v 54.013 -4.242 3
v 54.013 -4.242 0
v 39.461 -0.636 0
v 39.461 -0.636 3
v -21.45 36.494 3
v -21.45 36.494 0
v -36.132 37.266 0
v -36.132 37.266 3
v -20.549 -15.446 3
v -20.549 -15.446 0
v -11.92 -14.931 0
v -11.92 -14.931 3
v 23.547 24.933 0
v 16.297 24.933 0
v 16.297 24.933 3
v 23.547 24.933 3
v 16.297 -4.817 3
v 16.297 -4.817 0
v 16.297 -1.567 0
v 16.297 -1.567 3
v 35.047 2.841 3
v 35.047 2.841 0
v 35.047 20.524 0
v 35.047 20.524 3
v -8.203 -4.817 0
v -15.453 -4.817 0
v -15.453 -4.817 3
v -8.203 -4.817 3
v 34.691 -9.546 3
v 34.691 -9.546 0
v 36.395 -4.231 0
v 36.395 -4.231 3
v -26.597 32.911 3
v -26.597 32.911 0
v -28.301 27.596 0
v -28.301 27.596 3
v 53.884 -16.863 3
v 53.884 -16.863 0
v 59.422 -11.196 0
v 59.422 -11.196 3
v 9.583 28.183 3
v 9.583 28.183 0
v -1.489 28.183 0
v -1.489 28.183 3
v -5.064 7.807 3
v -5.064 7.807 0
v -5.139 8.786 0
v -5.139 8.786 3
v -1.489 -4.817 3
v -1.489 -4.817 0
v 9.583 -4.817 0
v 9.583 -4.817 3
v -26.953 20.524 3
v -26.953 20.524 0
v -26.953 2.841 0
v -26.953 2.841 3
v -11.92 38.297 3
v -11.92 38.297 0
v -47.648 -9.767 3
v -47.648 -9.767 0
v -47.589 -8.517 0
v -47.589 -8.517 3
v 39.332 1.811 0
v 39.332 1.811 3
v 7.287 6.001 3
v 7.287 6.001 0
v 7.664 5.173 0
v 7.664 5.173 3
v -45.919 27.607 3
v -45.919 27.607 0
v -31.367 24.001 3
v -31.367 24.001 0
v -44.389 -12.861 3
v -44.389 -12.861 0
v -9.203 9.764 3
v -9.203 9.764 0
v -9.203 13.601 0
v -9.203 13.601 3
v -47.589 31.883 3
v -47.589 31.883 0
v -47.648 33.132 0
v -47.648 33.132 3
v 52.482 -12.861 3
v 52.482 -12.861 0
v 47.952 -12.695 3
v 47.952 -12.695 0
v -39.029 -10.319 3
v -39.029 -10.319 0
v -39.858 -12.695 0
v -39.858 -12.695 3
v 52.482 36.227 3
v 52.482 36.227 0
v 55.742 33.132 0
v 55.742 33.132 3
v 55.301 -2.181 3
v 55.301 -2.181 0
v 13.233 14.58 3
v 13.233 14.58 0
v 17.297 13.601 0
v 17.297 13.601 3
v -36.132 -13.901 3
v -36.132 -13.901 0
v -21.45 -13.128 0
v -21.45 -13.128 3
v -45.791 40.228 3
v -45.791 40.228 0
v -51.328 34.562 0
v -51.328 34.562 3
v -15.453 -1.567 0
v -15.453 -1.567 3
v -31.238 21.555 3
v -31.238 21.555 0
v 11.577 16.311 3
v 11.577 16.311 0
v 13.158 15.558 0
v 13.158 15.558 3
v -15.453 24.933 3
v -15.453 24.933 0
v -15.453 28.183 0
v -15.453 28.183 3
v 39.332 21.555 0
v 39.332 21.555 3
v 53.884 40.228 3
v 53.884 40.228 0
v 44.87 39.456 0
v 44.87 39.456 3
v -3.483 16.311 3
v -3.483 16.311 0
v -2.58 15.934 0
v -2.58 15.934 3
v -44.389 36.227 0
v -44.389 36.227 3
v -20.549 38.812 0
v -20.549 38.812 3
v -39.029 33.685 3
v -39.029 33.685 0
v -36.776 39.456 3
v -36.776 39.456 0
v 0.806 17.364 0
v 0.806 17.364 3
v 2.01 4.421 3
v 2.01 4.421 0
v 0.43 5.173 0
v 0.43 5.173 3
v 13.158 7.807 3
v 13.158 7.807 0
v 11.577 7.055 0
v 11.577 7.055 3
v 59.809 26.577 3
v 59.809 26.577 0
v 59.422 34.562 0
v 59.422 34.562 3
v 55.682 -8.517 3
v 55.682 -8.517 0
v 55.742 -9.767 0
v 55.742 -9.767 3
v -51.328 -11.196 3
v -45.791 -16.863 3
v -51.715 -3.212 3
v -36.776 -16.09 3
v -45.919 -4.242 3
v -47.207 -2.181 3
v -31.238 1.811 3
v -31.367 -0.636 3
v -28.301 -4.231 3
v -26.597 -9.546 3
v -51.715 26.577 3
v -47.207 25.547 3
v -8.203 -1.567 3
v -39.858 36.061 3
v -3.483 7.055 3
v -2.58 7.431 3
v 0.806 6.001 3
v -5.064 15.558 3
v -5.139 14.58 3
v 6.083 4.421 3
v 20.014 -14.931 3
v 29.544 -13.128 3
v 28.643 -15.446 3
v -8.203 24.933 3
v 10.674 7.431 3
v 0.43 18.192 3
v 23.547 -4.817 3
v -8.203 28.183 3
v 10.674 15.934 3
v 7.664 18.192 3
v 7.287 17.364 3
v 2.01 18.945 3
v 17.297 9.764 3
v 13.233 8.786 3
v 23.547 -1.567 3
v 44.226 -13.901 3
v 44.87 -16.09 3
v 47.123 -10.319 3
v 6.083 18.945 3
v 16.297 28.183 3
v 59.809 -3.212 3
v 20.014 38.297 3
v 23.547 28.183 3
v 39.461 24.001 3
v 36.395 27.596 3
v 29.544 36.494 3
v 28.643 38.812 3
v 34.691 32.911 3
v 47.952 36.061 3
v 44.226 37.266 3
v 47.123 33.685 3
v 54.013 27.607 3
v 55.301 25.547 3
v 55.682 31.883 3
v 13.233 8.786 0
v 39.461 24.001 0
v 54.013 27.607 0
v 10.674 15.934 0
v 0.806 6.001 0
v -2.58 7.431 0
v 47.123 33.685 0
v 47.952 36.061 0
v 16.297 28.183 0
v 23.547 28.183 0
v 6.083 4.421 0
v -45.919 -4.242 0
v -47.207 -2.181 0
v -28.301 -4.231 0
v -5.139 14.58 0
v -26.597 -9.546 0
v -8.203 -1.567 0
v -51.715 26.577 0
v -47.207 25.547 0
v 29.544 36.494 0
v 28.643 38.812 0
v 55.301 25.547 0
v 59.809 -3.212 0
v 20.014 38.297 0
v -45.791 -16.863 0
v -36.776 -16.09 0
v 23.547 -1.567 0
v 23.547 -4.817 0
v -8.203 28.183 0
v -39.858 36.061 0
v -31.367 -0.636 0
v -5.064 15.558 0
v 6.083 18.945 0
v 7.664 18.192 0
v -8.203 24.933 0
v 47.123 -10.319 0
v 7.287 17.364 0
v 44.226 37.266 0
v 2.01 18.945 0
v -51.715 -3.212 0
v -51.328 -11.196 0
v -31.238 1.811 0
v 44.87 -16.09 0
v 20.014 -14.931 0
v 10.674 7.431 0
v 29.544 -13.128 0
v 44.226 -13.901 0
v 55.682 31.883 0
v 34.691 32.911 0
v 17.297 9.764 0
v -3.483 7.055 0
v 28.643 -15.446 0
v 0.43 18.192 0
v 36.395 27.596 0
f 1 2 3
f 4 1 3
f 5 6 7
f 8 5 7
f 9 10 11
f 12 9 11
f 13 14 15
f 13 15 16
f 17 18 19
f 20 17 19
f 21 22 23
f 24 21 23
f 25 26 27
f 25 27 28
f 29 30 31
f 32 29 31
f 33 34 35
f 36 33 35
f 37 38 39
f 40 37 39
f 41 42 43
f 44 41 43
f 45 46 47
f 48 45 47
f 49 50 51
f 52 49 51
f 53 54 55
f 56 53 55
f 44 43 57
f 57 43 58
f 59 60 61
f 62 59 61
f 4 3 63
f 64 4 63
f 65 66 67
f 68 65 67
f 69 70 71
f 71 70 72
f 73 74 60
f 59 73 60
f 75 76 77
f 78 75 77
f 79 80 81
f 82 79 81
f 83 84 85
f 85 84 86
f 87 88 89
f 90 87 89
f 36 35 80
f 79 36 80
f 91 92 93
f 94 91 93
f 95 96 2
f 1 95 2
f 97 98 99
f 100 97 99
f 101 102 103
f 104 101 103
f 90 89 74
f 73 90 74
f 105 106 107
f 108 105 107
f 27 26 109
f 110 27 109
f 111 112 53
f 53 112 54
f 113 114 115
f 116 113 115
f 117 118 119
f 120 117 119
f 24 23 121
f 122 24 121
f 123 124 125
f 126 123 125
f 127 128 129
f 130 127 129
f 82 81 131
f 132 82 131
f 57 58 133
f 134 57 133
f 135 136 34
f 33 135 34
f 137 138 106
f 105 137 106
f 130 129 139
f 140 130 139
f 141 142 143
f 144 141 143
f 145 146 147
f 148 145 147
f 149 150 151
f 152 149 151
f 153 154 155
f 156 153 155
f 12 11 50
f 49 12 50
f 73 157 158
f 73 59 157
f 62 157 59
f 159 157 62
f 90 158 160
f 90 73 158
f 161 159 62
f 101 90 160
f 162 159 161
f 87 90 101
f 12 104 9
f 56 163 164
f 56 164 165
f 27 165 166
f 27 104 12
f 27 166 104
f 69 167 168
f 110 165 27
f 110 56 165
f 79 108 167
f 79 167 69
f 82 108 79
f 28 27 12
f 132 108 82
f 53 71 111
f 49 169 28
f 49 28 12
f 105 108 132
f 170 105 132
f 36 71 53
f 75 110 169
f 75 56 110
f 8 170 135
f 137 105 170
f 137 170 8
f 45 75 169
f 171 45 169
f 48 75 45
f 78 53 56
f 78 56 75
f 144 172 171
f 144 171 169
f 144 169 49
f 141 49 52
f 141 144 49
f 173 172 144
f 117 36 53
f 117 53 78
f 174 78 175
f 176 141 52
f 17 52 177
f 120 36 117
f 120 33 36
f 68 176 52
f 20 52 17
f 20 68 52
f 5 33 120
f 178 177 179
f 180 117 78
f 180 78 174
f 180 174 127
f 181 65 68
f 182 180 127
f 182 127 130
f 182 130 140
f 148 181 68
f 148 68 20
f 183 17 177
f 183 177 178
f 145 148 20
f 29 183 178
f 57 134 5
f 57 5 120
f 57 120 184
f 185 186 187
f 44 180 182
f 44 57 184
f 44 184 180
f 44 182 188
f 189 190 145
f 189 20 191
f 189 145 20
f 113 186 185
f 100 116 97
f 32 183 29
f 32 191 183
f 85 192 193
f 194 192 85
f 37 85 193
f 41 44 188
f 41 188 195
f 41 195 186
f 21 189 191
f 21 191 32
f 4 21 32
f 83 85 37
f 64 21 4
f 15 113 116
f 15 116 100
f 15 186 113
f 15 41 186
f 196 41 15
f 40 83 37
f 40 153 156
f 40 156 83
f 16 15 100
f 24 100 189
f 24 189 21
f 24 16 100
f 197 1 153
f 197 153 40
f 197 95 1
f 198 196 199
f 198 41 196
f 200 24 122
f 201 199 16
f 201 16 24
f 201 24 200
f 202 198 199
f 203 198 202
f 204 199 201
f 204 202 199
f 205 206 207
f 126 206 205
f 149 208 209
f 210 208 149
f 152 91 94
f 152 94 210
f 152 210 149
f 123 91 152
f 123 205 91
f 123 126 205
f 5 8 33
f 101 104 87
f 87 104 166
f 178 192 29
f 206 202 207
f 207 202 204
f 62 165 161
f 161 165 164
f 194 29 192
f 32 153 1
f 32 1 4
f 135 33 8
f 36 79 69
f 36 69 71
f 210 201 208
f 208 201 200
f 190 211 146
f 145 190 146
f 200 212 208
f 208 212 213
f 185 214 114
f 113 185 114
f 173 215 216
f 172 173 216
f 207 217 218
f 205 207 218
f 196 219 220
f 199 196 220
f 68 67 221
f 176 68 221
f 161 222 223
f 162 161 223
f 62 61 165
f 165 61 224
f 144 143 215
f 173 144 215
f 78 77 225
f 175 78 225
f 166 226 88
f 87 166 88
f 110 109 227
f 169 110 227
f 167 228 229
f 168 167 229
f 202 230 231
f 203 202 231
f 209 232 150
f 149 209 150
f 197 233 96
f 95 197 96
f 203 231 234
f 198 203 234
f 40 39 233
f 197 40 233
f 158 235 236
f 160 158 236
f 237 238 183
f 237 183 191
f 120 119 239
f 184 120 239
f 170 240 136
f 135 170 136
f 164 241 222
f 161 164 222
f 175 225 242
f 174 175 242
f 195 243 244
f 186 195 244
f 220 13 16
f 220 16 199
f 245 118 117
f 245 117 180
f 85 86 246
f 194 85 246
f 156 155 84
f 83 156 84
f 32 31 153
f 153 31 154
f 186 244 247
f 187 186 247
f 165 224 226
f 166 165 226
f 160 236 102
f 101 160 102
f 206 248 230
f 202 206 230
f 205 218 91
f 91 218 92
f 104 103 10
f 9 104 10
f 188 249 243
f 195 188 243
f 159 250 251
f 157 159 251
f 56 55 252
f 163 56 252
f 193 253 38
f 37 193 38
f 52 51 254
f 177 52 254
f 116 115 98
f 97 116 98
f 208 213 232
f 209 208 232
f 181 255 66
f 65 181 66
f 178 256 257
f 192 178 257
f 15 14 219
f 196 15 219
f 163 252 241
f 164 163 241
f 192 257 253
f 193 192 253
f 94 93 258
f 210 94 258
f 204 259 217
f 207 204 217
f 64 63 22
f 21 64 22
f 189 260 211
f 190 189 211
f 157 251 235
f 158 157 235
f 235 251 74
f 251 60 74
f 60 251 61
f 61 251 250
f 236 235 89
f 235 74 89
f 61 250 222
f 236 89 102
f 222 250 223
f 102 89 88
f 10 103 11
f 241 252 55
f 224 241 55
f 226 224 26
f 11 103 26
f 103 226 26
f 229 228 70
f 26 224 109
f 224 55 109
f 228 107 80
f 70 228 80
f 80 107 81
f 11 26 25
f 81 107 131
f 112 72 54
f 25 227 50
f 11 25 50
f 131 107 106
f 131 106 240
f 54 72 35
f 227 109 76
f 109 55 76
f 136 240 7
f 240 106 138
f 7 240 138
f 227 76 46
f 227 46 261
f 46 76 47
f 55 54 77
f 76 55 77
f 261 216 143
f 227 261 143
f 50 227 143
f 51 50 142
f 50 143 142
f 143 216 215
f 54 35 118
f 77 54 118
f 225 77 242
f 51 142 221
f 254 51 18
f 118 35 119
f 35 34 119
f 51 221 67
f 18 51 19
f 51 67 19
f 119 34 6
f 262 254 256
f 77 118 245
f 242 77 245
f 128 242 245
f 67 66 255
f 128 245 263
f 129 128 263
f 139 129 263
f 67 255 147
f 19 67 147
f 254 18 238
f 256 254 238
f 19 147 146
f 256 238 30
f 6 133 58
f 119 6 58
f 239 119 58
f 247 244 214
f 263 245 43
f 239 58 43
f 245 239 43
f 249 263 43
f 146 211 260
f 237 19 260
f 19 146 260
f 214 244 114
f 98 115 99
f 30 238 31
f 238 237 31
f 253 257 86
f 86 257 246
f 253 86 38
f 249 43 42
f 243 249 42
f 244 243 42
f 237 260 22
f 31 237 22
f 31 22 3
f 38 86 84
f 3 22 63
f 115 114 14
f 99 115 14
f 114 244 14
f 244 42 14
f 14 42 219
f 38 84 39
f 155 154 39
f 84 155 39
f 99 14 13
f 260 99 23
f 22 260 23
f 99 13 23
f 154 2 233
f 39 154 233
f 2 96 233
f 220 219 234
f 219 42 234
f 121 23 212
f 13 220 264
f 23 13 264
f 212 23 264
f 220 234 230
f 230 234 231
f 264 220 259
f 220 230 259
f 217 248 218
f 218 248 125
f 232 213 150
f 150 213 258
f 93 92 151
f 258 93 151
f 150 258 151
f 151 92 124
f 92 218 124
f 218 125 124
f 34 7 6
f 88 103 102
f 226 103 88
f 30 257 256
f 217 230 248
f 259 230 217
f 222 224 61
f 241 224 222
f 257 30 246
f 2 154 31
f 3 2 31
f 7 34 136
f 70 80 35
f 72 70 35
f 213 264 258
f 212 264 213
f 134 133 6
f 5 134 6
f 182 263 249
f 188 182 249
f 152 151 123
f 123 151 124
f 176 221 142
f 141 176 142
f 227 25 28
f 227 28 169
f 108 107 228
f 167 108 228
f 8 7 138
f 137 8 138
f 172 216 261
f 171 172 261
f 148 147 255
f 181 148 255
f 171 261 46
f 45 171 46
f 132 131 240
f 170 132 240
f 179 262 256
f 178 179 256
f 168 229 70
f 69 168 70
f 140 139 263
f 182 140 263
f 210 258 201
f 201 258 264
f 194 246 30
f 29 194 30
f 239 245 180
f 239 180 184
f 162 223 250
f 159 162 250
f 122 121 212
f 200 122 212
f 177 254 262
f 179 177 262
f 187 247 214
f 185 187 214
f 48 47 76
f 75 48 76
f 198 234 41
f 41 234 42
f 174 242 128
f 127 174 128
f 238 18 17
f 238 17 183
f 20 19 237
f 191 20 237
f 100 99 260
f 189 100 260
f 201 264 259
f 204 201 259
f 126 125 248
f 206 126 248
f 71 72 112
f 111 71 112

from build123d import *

# Parameters (mm, degrees)
F0_W     = 7.25
F0_H     = 3.25
F1_DEPTH = 3


with BuildPart() as f1:
    # F0 (on Top) → F1 (new body)
    with BuildSketch(Plane.XY):
        Polygon((9.582664, 28.182806), (4.046888, 28.182806), (-1.488889, 28.182806), (-11.920412, 38.29651), (-20.548956, 38.811646), (-21.450445, 36.493532), (-36.131848, 37.266236), (-36.775768, 39.455567), (-45.790665, 40.228274), (-51.328391, 34.561768), (-51.714741, 26.577145), (-47.207296, 25.546871), (-45.919452, 27.607419), (-31.366833, 24.001461), (-31.238047, 21.554559), (-26.953112, 20.524286), (-26.953112, 11.682806), (-26.953112, 2.841327), (-31.238047, 1.811053), (-31.366833, -0.635848), (-45.919452, -4.241806), (-47.207296, -2.181258), (-51.714741, -3.211532), (-51.328391, -11.196155), (-45.790665, -16.862661), (-36.775768, -16.089954), (-36.131848, -13.900623), (-21.450445, -13.127919), (-20.548956, -15.446034), (-11.920412, -14.930897), (-1.488889, -4.817194), (4.046888, -4.817194), (9.582664, -4.817194), (20.014187, -14.930897), (28.642732, -15.446034), (29.54422, -13.127919), (44.225623, -13.900623), (44.869543, -16.089954), (53.88444, -16.862661), (59.422166, -11.196155), (59.808516, -3.211532), (55.301071, -2.181258), (54.013227, -4.241806), (39.460608, -0.635848), (39.331823, 1.811053), (35.046888, 2.841327), (35.046888, 20.524286), (39.331823, 21.554559), (39.460608, 24.001461), (54.013227, 27.607419), (55.301071, 25.546871), (59.808516, 26.577145), (59.422166, 34.561768), (53.88444, 40.228274), (44.869543, 39.455567), (44.225623, 37.266236), (29.54422, 36.493532), (28.642732, 38.811646), (20.014187, 38.29651), align=None)
        Polygon((-47.588665, -8.516893), (-28.300909, -4.230727), (-26.597083, -9.545867), (-39.028991, -10.319404), (-39.857782, -12.695283), (-44.388525, -12.86104), (-47.648445, -9.766877), align=None, mode=Mode.SUBTRACT)
        with Locations((-11.828112, -3.192194)):
            Rectangle(F0_W, F0_H, mode=Mode.SUBTRACT)
        with Locations((19.921888, -3.192194)):
            Rectangle(F0_W, F0_H, mode=Mode.SUBTRACT)
        Polygon((34.690858, -9.545867), (36.394685, -4.230727), (55.68244, -8.516893), (55.74222, -9.766877), (52.482301, -12.86104), (47.951558, -12.695283), (47.122766, -10.319404), align=None, mode=Mode.SUBTRACT)
        Polygon((-9.203112, 9.764191), (-9.203112, 11.682806), (-9.203112, 13.601422), (-5.139121, 14.579791), (-5.063862, 15.55816), (-3.483421, 16.31075), (-2.580312, 15.934454), (0.806347, 17.364377), (0.430051, 18.192228), (2.010493, 18.944819), (4.046888, 18.944819), (6.083283, 18.944819), (7.663724, 18.192228), (7.287428, 17.364377), (10.674088, 15.934454), (11.577197, 16.31075), (13.157638, 15.55816), (13.232897, 14.579791), (17.296888, 13.601422), (17.296888, 11.682806), (17.296888, 9.764191), (13.232897, 8.785822), (13.157638, 7.807453), (11.577197, 7.054863), (10.674088, 7.431159), (7.287428, 6.001236), (7.663724, 5.173385), (6.083283, 4.420794), (4.046888, 4.420794), (2.010493, 4.420794), (0.430051, 5.173385), (0.806347, 6.001236), (-2.580312, 7.431159), (-3.483421, 7.054863), (-5.063862, 7.807453), (-5.139121, 8.785822), align=None, mode=Mode.SUBTRACT)
        Polygon((-26.597083, 32.911479), (-28.300909, 27.59634), (-47.588665, 31.882506), (-47.648445, 33.13249), (-44.388525, 36.226653), (-39.857782, 36.060896), (-39.028991, 33.685017), align=None, mode=Mode.SUBTRACT)
        with Locations((-11.828112, 26.557806)):
            Rectangle(F0_W, F0_H, mode=Mode.SUBTRACT)
        with Locations((19.921888, 26.557806)):
            Rectangle(F0_W, F0_H, mode=Mode.SUBTRACT)
        Polygon((36.394685, 27.59634), (34.690858, 32.911479), (47.122766, 33.685017), (47.951558, 36.060896), (52.482301, 36.226653), (55.74222, 33.13249), (55.68244, 31.882506), align=None, mode=Mode.SUBTRACT)
    extrude(amount=F1_DEPTH)


solid = f1.part
